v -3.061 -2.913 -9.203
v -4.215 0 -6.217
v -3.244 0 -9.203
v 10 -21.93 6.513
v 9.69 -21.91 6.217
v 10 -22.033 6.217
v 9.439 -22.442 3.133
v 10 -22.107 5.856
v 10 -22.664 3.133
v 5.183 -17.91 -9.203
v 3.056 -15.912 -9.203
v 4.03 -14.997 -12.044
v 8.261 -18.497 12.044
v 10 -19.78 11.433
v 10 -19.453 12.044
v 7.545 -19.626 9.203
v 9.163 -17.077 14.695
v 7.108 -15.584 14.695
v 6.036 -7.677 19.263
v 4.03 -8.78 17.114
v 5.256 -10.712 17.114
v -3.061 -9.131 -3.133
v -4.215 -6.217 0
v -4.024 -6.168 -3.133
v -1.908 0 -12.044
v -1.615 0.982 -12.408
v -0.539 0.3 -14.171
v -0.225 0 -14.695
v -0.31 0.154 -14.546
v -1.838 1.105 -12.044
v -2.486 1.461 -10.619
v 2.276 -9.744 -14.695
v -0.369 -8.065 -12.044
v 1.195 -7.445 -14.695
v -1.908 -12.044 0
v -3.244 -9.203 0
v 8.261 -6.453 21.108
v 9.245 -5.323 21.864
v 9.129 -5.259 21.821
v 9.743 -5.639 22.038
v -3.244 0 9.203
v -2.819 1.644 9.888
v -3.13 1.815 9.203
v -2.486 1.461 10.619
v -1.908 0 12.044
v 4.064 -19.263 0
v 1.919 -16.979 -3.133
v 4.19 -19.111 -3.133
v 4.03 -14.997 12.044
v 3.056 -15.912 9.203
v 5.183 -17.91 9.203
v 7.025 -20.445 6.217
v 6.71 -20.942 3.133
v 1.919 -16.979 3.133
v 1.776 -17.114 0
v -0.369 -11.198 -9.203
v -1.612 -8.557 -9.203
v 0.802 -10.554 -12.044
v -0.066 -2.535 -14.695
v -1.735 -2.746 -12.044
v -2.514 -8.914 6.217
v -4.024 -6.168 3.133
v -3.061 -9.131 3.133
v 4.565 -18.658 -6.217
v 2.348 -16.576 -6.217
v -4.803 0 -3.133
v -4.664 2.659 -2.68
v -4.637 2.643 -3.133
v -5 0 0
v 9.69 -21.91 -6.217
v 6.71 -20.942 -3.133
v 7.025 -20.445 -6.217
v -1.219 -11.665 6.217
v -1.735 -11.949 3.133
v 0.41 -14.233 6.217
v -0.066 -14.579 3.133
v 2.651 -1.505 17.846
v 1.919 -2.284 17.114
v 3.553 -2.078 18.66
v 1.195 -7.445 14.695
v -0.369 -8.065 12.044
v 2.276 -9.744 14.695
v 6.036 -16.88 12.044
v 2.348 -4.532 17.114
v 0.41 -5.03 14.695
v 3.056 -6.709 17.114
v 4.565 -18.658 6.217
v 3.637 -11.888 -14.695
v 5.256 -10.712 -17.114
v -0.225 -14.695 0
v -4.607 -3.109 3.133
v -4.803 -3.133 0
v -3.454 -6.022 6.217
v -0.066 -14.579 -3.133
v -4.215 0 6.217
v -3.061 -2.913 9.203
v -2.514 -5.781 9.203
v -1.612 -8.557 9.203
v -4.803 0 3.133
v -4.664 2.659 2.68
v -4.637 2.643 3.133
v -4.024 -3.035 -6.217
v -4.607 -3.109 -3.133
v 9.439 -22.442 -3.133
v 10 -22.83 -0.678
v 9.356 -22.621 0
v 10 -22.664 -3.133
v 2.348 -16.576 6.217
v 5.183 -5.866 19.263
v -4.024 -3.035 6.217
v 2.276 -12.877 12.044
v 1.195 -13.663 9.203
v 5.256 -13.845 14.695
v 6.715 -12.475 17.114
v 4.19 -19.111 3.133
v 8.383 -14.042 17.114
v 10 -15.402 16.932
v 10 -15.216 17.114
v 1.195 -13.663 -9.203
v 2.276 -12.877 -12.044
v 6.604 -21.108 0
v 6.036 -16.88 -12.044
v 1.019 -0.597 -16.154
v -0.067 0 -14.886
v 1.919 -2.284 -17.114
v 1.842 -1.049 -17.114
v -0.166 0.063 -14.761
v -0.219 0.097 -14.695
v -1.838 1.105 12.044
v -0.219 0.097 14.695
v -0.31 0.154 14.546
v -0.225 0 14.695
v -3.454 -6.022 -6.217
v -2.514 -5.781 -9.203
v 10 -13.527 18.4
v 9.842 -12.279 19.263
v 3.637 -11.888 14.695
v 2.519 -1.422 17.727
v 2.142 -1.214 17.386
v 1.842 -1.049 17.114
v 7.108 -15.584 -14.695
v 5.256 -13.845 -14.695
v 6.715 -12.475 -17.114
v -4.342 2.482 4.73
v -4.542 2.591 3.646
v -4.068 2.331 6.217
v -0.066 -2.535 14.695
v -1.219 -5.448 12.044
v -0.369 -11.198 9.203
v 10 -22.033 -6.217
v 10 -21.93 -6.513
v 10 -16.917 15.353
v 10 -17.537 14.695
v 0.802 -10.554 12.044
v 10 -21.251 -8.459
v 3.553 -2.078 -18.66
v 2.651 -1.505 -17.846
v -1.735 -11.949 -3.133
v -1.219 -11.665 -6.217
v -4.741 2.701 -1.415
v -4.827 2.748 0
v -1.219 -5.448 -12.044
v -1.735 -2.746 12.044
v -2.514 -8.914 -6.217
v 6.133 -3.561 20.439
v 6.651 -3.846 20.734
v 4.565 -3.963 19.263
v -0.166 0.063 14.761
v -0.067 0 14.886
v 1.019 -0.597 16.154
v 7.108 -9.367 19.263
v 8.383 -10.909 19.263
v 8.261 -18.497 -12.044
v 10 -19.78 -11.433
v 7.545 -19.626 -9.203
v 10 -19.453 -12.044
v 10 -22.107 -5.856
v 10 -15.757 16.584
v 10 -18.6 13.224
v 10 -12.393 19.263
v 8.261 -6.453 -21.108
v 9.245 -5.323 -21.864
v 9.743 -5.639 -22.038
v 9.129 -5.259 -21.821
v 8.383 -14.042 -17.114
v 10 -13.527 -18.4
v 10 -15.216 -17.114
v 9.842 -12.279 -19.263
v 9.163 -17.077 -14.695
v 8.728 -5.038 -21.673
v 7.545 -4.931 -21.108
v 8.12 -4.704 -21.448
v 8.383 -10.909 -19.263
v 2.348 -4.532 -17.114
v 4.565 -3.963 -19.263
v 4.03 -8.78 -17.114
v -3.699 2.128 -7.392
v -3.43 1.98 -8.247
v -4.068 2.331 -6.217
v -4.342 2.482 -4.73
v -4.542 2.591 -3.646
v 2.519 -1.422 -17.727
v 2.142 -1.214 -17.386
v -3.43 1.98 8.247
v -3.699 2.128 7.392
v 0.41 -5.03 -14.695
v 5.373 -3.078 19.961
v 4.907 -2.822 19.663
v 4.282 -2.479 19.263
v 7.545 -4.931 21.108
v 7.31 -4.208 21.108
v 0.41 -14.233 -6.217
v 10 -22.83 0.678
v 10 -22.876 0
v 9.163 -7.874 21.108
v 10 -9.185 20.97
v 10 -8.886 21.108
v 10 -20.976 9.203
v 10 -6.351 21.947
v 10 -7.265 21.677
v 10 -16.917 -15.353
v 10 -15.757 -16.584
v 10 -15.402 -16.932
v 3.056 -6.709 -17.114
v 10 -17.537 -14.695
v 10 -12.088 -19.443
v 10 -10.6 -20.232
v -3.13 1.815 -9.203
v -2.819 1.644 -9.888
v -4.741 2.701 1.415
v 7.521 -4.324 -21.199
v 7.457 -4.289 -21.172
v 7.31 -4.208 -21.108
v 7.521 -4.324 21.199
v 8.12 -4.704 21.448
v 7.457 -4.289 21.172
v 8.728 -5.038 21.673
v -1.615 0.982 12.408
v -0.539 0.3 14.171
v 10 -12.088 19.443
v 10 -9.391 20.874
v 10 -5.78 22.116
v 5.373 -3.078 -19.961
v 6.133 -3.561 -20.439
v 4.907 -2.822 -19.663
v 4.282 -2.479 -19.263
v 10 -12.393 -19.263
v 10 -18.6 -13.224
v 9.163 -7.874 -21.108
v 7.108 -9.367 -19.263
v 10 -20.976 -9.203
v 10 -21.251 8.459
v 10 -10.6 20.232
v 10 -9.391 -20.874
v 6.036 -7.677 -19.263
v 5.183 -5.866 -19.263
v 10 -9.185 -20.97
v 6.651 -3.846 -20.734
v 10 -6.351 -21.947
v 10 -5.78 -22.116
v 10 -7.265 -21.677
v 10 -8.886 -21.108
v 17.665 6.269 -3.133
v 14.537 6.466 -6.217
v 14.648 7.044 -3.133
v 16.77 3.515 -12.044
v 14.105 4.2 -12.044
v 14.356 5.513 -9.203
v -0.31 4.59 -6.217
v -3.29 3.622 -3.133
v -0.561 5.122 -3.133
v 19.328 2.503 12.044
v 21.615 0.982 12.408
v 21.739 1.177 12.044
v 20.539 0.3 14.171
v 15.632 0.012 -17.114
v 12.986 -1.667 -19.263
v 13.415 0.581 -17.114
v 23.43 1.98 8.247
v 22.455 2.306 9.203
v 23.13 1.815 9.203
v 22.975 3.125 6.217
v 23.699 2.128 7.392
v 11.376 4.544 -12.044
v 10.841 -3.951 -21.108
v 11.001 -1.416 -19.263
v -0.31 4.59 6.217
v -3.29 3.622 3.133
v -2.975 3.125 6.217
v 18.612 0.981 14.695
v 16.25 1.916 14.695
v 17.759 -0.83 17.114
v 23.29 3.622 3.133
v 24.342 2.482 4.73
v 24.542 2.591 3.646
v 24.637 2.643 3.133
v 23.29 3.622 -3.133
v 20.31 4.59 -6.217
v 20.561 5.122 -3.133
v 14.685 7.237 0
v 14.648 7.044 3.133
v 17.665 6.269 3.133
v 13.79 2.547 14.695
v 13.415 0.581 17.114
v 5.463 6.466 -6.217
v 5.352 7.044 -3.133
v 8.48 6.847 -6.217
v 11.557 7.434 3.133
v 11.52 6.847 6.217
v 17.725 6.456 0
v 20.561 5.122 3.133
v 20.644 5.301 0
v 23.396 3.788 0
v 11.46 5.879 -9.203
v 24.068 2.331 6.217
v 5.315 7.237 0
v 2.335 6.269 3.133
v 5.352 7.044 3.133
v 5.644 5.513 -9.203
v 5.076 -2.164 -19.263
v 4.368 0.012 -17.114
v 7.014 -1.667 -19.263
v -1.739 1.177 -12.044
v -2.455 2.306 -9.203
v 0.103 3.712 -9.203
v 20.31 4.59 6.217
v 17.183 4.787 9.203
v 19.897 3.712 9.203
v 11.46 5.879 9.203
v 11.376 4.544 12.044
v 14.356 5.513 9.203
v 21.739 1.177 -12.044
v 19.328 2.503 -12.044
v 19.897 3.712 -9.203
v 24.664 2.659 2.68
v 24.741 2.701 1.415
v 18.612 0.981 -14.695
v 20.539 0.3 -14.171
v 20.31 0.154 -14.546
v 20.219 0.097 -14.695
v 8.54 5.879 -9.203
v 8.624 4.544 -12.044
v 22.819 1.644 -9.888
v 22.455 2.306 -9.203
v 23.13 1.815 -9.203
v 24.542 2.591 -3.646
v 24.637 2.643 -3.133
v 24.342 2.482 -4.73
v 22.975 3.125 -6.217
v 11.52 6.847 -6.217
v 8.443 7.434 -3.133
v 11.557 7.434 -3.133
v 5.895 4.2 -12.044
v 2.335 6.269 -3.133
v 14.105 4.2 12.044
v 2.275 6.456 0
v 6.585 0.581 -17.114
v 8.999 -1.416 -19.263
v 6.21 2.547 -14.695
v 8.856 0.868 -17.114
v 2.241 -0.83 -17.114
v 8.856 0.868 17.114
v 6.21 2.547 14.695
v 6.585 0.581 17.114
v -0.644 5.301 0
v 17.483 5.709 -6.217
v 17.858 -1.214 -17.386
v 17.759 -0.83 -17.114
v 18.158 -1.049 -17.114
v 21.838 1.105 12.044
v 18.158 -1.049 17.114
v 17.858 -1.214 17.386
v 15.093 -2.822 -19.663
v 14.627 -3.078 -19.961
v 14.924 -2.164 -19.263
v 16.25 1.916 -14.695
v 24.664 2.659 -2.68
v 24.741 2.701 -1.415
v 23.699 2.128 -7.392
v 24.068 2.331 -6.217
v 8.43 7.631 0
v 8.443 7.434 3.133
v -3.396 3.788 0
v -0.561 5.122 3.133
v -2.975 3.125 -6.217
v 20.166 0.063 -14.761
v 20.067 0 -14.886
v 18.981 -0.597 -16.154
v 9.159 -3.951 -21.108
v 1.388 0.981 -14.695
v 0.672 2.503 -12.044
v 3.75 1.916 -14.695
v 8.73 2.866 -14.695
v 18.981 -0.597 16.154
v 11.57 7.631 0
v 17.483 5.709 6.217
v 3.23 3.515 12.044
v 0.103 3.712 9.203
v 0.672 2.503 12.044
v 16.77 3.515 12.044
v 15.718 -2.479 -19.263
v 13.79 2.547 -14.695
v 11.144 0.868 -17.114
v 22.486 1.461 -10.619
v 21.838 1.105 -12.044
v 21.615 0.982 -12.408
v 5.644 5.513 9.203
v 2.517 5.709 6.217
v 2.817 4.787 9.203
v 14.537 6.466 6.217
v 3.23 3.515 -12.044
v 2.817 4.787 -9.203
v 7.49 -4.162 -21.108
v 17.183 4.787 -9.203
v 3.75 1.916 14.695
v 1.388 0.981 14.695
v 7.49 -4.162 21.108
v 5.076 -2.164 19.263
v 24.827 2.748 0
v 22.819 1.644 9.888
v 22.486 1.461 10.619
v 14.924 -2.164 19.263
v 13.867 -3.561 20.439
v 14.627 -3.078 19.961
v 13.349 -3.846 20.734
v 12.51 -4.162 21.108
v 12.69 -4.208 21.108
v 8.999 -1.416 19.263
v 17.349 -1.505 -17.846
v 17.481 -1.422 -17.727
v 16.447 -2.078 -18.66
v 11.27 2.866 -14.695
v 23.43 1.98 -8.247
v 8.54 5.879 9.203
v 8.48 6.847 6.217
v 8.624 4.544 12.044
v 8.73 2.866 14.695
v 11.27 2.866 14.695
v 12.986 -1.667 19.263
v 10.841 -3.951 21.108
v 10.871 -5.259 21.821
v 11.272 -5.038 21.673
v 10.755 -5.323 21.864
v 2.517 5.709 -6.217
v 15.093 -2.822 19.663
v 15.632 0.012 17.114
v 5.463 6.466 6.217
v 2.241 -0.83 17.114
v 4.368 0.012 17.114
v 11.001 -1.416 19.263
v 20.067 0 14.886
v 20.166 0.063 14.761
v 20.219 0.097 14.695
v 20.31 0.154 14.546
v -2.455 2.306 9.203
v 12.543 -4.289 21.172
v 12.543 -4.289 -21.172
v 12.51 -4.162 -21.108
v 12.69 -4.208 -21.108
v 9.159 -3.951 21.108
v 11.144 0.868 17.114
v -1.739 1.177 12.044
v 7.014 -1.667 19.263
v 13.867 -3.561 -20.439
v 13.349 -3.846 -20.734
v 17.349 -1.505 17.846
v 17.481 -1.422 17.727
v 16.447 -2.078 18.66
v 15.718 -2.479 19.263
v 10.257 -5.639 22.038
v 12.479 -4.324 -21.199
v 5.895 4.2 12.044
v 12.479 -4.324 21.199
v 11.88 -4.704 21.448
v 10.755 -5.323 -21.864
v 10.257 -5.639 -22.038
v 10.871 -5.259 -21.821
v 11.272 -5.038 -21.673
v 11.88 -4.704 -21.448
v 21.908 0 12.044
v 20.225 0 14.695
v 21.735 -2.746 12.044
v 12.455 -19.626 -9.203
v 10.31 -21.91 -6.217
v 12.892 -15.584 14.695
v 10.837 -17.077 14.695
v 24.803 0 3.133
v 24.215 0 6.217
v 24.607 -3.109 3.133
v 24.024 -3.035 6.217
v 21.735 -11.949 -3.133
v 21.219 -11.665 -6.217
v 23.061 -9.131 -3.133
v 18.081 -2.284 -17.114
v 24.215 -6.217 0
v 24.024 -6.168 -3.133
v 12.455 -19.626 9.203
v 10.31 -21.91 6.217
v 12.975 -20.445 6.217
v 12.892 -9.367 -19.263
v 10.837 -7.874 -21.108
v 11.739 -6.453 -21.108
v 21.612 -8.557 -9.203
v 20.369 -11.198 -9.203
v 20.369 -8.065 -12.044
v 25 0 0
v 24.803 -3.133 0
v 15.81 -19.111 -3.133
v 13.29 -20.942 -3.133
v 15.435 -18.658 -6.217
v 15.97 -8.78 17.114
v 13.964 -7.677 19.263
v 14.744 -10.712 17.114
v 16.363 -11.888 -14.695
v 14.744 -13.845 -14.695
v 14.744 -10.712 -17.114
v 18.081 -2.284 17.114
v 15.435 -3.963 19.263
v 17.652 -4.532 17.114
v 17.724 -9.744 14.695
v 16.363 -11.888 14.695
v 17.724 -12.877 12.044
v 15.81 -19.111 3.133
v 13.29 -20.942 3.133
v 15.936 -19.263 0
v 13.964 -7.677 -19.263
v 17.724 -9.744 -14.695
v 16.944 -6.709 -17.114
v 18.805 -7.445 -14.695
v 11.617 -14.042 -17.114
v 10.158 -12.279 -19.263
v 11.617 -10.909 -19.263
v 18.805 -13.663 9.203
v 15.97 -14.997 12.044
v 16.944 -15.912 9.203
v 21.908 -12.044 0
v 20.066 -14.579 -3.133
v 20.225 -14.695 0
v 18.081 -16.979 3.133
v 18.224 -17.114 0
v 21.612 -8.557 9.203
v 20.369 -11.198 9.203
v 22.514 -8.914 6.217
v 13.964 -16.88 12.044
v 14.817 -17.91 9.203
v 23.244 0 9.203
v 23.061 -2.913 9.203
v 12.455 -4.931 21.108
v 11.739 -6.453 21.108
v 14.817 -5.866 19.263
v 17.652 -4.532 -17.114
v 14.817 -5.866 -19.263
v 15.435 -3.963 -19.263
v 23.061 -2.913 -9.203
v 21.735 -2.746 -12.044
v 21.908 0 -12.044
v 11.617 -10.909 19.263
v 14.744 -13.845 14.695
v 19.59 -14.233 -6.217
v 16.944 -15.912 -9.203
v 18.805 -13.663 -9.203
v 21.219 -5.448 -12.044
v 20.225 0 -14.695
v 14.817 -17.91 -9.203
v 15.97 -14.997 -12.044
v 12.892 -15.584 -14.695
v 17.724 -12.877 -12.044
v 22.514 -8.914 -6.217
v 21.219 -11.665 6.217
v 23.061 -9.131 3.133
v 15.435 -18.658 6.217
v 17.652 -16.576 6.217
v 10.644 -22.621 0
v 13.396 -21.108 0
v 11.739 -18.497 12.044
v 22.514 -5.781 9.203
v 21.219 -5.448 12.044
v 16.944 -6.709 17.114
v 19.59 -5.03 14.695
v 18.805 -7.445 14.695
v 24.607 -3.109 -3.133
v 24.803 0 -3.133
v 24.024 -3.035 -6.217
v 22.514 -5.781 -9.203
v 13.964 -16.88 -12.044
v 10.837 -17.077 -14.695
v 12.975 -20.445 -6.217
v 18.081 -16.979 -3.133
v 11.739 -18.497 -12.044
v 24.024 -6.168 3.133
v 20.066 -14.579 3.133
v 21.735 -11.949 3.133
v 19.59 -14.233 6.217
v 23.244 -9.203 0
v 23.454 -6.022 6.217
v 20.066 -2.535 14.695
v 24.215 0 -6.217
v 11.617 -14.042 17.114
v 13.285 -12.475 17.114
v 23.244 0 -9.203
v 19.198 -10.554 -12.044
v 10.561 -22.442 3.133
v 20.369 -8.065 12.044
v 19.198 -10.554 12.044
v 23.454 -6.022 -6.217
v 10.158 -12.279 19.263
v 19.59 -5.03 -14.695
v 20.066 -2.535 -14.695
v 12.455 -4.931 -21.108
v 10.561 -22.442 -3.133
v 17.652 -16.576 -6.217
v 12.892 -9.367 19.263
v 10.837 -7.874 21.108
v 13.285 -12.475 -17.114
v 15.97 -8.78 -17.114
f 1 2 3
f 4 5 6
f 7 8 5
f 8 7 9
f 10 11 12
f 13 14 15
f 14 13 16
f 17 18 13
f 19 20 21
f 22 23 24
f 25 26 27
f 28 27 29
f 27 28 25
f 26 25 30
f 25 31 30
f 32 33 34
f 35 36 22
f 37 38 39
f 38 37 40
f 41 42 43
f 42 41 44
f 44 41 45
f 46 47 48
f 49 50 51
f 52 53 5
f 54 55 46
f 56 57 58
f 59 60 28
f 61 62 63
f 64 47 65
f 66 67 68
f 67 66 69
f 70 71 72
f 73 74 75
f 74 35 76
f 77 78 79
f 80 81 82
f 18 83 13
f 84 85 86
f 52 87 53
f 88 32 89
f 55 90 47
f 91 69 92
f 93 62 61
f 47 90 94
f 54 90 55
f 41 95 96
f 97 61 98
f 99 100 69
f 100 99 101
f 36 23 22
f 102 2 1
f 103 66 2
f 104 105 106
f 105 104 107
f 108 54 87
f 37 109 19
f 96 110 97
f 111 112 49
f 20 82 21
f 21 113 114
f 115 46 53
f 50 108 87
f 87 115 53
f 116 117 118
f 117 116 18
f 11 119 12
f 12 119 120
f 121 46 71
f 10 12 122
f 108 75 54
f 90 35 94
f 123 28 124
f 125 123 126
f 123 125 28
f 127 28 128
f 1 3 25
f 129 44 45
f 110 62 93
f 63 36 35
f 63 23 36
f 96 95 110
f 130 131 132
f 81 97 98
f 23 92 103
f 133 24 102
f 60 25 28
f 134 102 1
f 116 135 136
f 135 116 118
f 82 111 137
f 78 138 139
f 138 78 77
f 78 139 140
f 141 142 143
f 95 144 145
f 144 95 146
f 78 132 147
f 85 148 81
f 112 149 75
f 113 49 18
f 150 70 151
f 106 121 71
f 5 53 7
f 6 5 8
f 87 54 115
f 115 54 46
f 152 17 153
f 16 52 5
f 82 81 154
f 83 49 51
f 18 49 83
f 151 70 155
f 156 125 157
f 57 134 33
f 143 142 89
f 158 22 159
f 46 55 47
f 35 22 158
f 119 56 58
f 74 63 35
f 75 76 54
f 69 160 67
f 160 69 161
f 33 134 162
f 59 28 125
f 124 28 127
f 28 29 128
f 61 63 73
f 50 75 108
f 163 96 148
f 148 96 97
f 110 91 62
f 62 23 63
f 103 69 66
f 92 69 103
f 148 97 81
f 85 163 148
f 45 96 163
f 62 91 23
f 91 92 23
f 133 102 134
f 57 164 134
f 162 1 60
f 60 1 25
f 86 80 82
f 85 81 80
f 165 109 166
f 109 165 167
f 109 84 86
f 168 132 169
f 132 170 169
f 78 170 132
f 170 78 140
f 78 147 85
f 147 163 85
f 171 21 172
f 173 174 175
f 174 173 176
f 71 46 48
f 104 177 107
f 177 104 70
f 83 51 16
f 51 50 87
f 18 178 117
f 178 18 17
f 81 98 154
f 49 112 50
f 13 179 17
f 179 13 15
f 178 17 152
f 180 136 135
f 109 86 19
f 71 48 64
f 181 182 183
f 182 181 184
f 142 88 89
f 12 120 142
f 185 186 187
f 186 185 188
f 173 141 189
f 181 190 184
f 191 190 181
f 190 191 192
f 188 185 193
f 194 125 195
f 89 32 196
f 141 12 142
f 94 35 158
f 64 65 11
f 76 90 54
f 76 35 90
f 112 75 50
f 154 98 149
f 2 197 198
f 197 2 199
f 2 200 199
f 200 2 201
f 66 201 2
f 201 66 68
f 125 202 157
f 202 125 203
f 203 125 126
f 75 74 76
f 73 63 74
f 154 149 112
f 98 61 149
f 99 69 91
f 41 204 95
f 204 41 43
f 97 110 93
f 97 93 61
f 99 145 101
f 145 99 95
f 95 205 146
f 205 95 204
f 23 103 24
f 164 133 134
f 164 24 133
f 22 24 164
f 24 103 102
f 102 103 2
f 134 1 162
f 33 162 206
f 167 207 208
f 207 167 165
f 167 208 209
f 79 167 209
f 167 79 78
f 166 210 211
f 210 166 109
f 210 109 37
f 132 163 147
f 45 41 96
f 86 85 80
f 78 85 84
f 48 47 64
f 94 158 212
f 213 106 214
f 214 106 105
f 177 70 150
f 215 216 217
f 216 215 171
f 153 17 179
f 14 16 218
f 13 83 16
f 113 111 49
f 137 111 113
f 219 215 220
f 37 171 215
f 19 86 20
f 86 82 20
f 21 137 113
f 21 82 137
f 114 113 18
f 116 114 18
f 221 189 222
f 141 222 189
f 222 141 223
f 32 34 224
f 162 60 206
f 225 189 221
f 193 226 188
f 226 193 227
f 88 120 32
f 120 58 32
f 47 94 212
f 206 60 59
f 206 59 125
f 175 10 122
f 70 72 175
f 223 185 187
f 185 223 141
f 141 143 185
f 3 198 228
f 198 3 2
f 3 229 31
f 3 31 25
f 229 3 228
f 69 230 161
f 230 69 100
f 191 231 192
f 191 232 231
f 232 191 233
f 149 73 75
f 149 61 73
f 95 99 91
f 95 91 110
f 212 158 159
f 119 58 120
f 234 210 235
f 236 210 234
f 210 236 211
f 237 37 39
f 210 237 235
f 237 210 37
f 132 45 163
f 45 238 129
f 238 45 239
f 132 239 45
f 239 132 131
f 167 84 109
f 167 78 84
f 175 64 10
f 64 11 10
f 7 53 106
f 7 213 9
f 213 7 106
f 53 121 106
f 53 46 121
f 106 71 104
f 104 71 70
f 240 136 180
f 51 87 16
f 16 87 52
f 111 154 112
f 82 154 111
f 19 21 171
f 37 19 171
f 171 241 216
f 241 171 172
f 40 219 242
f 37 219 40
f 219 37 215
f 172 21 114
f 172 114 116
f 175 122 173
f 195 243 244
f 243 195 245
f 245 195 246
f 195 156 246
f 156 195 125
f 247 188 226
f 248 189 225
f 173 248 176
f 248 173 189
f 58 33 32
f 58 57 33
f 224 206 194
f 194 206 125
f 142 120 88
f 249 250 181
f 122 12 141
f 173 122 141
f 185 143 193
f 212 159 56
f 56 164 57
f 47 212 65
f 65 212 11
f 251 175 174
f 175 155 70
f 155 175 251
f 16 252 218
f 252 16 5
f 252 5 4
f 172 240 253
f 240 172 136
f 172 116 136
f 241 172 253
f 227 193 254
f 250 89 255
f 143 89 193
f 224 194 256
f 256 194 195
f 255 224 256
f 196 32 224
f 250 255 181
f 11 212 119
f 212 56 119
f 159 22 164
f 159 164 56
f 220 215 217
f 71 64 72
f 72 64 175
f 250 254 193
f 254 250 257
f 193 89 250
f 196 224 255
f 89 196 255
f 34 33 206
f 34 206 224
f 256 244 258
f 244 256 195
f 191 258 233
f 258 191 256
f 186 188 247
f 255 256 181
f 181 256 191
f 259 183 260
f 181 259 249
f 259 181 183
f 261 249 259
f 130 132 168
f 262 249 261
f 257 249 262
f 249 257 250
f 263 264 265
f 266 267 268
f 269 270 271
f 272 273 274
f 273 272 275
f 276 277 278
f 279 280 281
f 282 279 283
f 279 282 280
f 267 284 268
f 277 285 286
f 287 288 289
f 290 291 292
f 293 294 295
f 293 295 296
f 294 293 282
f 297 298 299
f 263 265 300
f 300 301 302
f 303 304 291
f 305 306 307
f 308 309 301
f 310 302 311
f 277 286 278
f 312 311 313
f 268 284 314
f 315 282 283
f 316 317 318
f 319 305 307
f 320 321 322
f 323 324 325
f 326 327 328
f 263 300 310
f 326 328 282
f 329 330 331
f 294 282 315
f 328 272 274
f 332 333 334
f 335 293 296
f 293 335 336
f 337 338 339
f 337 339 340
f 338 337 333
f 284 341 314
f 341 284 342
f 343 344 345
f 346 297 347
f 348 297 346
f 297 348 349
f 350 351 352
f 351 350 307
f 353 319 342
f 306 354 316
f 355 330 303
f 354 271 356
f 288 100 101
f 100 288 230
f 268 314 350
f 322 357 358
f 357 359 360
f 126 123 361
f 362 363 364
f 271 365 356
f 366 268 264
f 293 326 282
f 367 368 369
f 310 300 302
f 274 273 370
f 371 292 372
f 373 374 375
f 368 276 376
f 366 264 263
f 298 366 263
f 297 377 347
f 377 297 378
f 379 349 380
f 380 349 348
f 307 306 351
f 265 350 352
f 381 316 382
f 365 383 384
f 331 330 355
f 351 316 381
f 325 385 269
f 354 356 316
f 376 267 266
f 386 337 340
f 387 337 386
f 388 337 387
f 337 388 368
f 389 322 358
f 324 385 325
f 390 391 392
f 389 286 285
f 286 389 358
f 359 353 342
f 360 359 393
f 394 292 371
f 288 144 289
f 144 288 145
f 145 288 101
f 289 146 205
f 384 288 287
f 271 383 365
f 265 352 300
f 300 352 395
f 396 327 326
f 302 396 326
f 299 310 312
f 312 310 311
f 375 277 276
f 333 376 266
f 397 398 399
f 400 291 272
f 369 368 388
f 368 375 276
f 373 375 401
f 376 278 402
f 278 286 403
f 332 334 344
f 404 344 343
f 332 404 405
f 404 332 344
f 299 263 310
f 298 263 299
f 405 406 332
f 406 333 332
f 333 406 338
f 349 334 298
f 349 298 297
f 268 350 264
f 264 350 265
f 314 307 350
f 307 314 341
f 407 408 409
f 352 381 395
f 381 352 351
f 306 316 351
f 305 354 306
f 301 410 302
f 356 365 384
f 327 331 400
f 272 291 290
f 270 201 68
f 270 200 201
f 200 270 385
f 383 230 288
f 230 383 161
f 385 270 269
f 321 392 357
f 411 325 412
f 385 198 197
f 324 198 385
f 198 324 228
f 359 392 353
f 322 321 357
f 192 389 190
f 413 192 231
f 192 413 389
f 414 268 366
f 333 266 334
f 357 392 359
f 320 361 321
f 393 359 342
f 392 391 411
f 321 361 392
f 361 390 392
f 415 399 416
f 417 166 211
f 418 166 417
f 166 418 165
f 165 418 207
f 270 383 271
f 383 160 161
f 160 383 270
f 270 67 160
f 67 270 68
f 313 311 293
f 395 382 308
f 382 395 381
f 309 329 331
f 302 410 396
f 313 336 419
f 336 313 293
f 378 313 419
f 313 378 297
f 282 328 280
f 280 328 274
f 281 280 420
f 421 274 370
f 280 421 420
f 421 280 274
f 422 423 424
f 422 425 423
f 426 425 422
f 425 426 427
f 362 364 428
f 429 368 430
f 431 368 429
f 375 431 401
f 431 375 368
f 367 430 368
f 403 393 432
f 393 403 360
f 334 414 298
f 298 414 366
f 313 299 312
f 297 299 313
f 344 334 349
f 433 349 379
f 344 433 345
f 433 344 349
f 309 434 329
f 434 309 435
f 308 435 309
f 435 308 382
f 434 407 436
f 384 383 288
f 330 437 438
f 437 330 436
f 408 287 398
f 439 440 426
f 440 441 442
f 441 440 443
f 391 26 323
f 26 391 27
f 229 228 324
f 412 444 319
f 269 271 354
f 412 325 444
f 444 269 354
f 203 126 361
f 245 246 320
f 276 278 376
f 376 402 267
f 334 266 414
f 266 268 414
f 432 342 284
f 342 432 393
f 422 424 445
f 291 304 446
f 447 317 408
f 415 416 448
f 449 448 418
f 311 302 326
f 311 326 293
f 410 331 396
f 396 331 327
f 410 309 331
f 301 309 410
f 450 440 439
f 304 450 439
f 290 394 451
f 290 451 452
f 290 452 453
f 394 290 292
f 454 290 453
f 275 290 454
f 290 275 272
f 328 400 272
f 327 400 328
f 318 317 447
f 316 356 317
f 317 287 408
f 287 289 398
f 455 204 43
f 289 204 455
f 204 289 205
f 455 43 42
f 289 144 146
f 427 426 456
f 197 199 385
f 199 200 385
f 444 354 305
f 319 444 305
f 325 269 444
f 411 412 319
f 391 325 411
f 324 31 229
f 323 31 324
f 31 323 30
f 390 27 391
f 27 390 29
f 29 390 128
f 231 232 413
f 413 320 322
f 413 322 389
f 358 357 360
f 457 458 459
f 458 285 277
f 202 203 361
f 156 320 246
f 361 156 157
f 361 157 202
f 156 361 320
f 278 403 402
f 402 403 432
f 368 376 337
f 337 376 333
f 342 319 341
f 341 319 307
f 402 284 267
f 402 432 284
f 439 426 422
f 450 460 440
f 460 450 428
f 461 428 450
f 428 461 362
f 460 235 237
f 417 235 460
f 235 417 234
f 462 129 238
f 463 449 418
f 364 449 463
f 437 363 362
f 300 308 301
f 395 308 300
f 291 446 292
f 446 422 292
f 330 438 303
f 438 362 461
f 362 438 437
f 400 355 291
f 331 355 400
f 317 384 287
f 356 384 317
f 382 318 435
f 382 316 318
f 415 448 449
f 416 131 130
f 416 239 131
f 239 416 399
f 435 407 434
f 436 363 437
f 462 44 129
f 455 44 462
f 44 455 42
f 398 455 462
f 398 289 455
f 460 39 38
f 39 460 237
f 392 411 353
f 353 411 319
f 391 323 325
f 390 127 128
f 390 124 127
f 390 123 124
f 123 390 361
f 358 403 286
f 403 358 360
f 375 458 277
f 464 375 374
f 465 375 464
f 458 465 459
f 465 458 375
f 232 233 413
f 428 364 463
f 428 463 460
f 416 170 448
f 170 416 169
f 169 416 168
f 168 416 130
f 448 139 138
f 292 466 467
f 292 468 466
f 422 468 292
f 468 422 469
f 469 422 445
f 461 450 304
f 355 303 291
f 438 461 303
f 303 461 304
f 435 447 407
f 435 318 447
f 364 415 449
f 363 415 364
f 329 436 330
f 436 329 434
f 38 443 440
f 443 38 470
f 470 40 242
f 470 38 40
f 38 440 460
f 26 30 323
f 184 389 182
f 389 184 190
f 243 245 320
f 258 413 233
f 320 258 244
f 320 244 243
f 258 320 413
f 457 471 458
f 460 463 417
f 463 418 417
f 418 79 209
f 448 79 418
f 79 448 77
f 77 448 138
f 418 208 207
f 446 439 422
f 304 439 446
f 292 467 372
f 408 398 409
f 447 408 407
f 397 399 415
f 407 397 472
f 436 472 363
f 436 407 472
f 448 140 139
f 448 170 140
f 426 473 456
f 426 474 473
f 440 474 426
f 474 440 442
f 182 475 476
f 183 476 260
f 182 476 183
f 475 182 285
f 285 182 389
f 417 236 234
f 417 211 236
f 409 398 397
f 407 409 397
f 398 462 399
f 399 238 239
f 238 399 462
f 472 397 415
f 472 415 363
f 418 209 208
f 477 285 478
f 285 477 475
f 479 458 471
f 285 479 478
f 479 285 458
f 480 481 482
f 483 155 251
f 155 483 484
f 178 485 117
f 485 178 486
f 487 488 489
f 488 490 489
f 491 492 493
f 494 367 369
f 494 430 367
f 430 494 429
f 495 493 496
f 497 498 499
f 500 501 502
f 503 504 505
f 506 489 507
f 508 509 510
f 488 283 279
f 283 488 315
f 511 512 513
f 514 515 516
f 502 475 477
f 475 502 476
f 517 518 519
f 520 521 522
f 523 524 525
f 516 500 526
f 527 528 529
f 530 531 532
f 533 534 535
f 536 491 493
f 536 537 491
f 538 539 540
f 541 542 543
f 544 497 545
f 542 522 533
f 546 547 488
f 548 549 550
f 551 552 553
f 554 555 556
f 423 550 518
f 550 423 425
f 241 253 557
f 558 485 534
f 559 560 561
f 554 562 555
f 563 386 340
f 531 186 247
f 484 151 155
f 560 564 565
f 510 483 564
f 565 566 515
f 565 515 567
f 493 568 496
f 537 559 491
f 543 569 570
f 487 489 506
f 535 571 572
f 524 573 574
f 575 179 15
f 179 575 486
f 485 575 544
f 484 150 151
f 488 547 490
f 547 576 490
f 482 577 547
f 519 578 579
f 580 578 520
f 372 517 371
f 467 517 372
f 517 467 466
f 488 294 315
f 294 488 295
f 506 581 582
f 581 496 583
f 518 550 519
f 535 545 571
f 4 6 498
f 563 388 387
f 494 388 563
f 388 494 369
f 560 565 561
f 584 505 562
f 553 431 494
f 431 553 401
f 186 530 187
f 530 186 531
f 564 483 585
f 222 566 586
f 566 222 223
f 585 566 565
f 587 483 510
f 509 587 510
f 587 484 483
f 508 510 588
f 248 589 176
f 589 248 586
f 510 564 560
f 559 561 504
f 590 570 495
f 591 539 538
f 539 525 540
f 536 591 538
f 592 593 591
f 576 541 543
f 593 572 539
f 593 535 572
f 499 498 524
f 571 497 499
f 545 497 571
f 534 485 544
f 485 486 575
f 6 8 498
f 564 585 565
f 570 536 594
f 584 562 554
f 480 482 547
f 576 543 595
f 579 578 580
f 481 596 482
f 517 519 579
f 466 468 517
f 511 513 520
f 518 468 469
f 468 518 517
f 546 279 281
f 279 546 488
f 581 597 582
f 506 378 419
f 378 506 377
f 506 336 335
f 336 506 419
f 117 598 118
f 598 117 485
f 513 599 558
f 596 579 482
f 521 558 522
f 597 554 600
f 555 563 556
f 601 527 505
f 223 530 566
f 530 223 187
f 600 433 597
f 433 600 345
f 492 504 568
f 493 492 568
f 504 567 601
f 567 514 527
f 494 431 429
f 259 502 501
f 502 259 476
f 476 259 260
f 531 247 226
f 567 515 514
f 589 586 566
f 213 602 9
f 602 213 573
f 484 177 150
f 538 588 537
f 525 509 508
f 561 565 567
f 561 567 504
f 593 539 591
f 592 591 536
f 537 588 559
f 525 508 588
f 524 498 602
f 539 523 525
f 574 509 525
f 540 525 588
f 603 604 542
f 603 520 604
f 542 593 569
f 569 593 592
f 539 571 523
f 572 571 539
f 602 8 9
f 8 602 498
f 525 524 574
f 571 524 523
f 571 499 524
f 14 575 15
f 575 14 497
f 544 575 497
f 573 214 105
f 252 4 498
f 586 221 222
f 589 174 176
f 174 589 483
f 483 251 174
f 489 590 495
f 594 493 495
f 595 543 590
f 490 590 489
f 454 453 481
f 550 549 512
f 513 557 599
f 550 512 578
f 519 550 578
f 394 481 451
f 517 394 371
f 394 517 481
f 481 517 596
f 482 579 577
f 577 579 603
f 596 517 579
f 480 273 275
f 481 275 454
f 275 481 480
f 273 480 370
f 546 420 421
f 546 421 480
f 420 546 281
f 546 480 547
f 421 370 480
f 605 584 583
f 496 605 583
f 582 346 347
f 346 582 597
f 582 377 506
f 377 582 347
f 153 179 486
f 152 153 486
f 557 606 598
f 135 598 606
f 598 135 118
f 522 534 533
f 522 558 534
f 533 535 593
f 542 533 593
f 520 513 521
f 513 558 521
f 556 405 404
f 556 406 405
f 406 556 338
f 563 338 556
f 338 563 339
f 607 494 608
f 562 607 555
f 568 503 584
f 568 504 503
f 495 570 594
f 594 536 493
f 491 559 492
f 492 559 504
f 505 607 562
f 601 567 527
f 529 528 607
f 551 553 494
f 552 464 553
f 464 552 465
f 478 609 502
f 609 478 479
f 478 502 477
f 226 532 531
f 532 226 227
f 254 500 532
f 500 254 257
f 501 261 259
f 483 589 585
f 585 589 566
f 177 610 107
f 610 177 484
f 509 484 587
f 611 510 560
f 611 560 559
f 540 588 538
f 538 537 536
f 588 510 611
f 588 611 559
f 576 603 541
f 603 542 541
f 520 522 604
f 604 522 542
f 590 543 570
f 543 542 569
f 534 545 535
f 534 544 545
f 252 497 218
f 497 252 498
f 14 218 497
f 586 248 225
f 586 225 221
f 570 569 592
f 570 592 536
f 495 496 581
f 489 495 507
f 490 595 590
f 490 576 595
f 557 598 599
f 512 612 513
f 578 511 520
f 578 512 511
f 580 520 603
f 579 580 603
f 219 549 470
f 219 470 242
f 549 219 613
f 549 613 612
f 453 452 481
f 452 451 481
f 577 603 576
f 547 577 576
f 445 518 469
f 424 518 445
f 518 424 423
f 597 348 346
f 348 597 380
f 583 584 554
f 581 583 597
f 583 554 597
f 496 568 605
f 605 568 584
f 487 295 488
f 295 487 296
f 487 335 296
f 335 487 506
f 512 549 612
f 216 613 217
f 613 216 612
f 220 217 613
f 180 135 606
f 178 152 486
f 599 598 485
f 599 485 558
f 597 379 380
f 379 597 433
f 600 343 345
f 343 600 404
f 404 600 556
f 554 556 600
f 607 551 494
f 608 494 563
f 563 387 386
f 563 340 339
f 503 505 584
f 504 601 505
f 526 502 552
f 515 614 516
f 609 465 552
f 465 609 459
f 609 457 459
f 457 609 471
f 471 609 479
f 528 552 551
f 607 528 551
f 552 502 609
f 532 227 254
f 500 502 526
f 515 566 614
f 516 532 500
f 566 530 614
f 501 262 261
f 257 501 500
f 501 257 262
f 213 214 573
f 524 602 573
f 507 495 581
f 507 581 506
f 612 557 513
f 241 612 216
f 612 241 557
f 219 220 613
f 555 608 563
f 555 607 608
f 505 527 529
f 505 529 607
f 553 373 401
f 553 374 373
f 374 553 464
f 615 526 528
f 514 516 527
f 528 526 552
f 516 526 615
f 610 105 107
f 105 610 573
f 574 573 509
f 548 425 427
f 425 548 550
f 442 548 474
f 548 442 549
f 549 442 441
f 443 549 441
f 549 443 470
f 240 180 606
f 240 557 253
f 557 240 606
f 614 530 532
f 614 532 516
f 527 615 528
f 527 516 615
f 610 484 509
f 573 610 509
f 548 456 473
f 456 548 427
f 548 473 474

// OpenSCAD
r = 25;
d = 20;
dh = d/2;
$fn = 50;

spheres();

module spheres() {
    intersection() {
        spA();
        spB();
        spC();
        }
    }

module spObject(){
    sphere(r, $fn, center=true);
    }

module spA() translate([d, 0, 0]) spObject();
module spB() translate([dh, -dh*1.732, 0]) spObject();
module spC() spObject();

echo(version=version());
